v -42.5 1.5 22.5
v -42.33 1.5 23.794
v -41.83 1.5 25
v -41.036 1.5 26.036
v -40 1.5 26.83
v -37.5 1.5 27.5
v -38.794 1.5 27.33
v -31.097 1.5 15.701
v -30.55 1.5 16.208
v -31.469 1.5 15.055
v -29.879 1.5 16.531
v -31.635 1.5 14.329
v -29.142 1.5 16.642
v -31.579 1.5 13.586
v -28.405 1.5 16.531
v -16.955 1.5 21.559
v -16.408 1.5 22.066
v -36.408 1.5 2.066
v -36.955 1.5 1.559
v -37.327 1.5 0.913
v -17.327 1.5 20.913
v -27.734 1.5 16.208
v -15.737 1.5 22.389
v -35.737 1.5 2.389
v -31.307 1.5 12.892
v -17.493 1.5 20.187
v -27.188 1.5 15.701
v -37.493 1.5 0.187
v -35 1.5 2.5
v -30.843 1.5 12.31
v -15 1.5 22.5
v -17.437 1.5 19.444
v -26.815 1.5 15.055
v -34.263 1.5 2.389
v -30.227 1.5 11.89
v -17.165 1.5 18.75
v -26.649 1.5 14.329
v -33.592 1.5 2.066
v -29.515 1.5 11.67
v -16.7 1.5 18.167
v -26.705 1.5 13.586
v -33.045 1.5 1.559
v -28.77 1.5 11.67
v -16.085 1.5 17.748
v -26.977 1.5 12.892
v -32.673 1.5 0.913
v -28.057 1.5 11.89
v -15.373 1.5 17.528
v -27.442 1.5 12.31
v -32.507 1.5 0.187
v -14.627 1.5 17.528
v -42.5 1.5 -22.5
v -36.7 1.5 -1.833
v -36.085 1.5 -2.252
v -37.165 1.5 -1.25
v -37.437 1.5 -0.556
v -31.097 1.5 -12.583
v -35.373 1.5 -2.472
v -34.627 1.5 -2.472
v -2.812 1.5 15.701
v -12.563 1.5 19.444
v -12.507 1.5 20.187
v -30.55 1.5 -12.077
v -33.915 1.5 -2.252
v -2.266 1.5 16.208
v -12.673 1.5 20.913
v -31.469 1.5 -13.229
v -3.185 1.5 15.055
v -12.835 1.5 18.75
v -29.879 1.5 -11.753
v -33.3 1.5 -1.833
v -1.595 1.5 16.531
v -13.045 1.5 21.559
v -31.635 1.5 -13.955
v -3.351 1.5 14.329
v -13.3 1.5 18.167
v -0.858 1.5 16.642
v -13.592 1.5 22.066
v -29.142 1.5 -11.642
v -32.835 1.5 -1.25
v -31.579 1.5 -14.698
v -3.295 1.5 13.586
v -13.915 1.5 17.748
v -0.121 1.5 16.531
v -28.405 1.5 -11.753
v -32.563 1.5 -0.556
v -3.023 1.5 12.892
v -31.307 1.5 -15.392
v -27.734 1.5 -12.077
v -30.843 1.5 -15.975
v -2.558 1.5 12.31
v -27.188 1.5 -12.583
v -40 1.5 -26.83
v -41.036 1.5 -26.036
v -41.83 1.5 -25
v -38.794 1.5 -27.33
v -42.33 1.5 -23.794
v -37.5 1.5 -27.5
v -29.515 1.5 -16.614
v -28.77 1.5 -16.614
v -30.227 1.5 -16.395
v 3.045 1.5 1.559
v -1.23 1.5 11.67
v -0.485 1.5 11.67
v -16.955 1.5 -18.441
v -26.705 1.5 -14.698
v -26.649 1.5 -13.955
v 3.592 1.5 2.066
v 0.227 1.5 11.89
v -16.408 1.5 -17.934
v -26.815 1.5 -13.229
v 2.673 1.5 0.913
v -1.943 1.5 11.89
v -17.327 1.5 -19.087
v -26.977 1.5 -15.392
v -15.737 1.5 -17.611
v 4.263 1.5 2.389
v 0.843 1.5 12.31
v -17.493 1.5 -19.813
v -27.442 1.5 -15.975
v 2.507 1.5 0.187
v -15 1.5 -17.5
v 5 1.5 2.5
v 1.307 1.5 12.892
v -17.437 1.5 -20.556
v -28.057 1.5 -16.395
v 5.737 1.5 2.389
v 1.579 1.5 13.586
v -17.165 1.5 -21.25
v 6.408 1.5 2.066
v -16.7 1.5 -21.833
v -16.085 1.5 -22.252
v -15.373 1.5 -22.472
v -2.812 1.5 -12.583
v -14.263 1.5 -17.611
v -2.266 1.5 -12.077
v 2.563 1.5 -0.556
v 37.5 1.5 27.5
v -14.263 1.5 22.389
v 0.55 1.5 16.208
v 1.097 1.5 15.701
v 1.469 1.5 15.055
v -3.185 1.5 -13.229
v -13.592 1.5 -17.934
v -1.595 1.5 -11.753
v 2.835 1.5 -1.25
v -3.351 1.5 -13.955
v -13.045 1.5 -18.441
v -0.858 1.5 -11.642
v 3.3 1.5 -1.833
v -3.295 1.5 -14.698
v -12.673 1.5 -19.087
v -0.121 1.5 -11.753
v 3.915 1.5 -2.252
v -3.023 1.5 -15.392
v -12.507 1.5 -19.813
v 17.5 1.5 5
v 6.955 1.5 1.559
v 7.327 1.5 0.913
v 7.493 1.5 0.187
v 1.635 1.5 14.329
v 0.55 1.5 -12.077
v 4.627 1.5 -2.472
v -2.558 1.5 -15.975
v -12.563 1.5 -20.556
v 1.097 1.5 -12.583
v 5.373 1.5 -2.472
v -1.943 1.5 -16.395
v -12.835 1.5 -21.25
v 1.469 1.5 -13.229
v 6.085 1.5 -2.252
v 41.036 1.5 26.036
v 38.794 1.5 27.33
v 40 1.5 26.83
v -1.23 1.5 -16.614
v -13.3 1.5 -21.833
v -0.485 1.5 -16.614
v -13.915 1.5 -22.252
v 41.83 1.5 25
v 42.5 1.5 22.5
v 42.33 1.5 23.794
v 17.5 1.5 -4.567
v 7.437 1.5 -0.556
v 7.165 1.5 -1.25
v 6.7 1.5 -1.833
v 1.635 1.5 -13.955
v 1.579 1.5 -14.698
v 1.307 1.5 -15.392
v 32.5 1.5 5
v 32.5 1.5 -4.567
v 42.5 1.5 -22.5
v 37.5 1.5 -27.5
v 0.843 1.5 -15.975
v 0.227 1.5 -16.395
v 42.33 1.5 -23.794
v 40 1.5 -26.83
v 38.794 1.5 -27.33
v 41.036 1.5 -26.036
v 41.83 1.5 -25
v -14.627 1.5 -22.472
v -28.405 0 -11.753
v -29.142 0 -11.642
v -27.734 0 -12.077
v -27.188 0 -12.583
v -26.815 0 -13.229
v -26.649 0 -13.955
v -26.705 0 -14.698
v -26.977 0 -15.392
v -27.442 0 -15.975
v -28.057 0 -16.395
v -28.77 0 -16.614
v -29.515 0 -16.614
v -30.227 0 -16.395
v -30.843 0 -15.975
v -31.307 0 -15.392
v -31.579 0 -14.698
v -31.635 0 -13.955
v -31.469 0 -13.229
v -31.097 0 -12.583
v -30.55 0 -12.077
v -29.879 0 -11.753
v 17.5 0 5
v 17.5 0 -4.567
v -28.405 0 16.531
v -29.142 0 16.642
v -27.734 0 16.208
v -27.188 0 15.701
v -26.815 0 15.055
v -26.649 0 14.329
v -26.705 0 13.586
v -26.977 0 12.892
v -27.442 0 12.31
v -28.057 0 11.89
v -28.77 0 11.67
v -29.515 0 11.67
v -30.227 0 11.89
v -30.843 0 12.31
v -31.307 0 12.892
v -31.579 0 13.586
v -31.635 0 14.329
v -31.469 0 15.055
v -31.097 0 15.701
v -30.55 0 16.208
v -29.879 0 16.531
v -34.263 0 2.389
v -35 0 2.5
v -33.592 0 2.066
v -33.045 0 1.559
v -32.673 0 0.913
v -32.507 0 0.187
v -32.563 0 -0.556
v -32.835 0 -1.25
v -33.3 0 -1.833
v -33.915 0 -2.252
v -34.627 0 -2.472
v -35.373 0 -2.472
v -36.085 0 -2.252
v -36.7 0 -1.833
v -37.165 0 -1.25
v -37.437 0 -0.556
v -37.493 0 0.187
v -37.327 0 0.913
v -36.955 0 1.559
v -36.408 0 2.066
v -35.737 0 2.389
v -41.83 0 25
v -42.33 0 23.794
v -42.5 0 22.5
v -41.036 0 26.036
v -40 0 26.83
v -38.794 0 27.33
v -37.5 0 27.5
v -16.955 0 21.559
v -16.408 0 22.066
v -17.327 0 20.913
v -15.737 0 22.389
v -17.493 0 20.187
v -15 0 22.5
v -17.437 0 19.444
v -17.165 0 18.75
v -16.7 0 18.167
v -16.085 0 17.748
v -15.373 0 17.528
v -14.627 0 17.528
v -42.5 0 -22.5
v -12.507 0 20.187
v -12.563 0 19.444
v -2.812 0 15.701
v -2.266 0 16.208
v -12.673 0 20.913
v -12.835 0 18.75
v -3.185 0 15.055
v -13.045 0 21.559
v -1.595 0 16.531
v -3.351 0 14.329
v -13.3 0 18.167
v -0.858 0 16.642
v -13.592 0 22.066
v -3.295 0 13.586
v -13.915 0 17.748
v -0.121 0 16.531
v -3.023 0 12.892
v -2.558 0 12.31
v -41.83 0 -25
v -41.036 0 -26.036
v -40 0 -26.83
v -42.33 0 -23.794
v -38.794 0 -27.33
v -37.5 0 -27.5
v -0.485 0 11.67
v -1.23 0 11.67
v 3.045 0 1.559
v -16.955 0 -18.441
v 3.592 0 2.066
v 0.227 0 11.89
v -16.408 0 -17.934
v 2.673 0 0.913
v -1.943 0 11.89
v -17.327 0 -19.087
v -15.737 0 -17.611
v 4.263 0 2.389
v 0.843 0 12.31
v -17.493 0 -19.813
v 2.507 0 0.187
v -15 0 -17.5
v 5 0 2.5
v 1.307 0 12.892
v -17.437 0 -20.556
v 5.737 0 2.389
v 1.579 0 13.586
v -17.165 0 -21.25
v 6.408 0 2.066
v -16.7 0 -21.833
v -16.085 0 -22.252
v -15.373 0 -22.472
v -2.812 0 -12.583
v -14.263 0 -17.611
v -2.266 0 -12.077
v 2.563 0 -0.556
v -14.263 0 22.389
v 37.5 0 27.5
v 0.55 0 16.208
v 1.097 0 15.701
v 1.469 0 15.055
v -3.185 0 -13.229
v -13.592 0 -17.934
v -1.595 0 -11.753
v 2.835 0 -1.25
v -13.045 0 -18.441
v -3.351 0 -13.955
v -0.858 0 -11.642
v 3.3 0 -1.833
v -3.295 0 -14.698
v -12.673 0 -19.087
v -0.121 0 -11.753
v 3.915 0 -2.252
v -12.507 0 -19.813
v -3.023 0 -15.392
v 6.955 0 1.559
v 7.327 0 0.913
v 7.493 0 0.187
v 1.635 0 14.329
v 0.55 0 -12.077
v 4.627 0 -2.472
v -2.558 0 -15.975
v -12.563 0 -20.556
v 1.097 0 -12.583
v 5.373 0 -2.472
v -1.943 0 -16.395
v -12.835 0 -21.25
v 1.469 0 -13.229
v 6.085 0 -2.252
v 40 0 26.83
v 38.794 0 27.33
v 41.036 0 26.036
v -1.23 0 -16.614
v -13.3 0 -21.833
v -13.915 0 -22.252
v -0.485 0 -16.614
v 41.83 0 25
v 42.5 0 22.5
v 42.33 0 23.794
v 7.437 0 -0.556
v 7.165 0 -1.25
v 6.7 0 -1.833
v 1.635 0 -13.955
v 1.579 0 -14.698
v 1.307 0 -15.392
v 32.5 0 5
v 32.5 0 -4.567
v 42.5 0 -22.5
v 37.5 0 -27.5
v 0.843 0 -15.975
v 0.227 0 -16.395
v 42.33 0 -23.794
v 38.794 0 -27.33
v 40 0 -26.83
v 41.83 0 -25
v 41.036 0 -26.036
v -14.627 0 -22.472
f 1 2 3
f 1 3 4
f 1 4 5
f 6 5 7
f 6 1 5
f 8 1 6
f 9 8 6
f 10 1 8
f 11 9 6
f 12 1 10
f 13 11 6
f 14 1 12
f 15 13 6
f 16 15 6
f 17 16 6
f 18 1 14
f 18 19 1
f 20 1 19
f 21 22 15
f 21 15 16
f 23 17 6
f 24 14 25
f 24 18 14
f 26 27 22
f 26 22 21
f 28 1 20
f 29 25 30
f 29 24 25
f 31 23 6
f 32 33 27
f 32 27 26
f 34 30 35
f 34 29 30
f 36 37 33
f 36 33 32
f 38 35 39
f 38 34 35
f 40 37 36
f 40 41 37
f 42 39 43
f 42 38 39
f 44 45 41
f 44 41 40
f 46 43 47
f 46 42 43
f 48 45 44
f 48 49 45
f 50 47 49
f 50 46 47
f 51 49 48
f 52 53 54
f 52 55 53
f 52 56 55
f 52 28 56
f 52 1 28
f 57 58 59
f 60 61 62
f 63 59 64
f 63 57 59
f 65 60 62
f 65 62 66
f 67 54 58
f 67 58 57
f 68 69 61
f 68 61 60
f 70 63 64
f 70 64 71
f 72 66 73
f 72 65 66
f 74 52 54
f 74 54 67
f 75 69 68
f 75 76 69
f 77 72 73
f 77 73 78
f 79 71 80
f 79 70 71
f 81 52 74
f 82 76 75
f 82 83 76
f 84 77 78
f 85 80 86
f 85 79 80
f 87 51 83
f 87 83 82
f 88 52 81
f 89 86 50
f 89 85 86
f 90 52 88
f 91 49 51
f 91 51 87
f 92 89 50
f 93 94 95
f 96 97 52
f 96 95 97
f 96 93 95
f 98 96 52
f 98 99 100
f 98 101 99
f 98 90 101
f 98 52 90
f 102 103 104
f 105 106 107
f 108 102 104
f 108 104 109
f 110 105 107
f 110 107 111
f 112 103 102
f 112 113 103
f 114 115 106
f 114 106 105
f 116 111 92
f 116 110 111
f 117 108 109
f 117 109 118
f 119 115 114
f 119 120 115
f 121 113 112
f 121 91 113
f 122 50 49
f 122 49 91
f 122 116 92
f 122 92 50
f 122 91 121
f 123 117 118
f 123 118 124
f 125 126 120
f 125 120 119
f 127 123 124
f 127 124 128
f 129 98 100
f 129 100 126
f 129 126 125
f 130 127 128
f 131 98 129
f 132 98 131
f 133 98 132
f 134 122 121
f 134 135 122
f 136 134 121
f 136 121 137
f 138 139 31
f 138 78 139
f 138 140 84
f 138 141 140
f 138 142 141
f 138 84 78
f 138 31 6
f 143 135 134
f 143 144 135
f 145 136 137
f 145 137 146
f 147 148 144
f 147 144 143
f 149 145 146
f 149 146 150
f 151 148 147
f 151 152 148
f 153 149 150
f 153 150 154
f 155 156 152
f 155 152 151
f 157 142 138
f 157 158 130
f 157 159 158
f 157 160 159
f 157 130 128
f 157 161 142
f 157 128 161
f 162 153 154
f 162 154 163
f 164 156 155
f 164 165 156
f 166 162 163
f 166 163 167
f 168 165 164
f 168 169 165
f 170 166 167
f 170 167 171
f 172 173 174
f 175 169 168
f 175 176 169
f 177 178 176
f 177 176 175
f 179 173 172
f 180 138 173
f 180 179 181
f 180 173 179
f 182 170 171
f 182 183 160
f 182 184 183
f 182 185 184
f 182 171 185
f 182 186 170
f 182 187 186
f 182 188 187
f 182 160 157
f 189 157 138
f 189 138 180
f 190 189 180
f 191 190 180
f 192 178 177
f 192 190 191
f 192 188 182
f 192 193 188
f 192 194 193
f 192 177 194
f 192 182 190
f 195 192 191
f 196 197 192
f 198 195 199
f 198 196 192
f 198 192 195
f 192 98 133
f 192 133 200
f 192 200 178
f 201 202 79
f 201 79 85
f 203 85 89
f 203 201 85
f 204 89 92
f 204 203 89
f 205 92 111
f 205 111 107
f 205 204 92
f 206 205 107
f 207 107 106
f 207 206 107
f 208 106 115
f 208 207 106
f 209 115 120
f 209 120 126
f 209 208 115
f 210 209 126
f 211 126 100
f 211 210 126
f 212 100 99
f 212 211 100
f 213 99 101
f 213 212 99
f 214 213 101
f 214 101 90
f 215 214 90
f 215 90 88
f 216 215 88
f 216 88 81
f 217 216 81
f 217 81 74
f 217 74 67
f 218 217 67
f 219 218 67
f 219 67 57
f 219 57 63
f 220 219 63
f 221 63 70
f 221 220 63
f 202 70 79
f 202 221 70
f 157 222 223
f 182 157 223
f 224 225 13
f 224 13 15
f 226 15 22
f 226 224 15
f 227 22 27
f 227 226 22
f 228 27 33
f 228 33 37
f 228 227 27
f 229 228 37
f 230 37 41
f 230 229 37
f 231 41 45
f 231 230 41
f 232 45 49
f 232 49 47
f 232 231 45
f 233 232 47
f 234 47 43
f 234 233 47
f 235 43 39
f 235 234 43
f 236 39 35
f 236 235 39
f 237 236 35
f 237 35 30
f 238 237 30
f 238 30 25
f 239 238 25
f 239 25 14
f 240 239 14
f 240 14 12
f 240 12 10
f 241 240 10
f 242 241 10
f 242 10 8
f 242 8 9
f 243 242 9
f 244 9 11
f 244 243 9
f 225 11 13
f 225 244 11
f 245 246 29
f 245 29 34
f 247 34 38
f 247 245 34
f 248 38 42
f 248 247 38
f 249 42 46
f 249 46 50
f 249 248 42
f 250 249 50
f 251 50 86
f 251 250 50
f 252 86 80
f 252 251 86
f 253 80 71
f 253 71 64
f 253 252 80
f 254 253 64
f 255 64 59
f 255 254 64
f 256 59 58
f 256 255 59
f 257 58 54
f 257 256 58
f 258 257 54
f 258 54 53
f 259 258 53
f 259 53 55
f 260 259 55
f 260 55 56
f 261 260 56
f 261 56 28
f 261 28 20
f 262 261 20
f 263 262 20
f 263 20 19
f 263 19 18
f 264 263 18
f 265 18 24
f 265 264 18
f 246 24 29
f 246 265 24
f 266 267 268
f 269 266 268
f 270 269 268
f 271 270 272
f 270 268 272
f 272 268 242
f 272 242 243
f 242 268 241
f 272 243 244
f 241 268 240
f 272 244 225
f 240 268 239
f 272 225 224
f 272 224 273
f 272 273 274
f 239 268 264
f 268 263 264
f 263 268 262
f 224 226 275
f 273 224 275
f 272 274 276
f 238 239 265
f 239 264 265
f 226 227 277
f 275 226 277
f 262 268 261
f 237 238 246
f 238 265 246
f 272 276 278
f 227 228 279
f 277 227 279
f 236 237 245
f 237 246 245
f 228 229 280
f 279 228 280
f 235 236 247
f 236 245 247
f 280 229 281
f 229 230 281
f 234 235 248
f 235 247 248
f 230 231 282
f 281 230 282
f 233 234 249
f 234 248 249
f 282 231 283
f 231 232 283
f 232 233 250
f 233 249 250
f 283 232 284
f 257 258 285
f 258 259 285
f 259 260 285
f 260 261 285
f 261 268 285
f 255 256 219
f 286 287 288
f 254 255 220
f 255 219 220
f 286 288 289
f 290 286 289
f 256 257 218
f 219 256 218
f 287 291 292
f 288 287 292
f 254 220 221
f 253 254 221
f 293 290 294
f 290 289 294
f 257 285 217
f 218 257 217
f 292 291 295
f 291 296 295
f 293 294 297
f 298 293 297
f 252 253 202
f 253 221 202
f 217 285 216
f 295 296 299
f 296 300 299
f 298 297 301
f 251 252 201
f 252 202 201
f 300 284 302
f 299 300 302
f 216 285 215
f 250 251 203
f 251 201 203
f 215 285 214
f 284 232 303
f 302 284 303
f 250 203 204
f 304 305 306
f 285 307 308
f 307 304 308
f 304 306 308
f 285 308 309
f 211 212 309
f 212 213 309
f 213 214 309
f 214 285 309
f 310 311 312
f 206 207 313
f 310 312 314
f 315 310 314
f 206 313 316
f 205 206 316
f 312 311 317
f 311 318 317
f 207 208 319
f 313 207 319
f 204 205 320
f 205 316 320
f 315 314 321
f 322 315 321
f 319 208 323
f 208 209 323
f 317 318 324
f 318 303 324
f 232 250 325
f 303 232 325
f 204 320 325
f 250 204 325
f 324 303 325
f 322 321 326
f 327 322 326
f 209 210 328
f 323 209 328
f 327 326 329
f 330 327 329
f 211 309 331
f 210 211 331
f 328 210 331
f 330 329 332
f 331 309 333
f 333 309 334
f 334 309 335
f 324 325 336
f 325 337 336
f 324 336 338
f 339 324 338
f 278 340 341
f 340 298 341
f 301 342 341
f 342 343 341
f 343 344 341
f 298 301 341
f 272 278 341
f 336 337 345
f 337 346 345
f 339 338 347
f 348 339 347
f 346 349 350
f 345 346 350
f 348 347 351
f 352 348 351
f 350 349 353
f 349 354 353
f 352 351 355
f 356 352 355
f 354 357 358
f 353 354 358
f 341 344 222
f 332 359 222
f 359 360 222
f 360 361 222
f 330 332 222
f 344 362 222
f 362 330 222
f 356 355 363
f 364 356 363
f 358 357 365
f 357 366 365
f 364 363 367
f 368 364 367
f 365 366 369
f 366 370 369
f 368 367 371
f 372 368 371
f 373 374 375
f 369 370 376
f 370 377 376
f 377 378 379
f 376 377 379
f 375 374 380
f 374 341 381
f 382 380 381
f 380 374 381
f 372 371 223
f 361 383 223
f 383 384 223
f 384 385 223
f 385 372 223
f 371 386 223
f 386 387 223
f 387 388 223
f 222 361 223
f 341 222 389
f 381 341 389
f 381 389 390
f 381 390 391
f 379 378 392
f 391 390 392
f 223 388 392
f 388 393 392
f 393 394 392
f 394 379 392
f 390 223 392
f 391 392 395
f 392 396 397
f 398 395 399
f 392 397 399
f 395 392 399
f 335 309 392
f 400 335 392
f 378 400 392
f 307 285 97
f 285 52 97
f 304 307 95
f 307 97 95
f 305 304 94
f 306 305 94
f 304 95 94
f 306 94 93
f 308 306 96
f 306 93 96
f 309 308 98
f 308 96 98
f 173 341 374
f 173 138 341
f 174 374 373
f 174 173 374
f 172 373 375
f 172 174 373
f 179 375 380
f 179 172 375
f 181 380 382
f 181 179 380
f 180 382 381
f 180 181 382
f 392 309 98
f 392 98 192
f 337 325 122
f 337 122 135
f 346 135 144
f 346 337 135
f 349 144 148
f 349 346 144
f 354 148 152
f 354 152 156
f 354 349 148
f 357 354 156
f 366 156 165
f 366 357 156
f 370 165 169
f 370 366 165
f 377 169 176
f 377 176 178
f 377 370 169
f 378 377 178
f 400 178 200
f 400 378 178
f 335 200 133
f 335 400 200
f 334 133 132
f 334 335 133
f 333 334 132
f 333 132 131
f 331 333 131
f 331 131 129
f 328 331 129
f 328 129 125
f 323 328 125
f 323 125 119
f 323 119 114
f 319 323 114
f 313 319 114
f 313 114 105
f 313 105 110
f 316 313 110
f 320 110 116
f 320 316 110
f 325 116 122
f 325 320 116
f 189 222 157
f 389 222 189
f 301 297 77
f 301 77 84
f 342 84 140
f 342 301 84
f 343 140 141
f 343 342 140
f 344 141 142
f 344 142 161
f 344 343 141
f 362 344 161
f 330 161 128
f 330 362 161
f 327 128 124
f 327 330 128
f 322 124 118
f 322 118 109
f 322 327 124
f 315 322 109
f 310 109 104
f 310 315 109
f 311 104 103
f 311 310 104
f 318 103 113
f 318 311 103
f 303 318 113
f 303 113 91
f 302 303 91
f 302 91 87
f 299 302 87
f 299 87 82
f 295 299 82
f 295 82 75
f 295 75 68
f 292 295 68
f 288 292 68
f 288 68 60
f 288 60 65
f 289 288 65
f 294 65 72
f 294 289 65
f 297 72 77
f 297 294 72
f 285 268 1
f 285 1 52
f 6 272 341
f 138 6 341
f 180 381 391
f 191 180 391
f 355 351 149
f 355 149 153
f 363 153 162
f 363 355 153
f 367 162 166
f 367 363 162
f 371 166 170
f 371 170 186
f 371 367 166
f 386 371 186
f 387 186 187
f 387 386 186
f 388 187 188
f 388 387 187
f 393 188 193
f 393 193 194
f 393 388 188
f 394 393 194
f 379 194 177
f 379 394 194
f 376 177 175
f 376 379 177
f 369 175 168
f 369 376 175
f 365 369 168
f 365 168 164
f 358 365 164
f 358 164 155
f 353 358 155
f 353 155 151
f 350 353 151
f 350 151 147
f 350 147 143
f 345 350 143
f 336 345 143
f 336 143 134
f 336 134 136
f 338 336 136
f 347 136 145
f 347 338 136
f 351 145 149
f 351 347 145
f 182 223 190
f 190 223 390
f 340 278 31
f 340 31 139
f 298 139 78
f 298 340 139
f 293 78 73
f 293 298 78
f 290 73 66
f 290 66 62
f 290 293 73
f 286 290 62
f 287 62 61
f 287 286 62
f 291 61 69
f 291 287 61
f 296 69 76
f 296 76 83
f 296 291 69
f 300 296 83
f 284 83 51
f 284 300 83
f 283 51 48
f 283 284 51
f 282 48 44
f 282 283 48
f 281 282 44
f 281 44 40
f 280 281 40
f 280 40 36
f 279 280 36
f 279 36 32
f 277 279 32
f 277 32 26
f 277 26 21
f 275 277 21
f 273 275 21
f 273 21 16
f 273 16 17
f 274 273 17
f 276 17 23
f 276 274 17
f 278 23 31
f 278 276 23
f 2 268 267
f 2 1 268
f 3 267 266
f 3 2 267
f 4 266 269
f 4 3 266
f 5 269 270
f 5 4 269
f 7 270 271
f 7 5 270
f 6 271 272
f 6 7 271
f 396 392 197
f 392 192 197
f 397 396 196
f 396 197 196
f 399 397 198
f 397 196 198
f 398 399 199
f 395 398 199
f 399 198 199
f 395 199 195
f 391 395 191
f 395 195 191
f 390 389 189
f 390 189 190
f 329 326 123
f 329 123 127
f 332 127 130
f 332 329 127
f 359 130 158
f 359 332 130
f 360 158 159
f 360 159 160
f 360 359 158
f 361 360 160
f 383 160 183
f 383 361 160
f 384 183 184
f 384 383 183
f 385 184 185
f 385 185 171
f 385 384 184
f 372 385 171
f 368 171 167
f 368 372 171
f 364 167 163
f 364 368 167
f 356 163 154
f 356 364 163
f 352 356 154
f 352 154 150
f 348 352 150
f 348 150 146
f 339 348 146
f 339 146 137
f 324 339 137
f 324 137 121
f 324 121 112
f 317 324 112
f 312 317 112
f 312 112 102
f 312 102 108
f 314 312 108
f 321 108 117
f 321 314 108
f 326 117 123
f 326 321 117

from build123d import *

# Parameters (mm, degrees)
SKETCH1_W           = 85
SKETCH1_H           = 55
SKETCH1_R           = 2.5
SKETCH1_W_2         = 15
SKETCH1_H_2         = 9.566733068
BOSS_EXTRUDE1_DEPTH = 1.5
FILLET1_R           = 5


with BuildPart() as part:
    # Sketch1 → Boss-Extrude1 (new body)
    with BuildSketch(Plane(origin=(0, 0, 0), x_dir=(1, 0, 0), z_dir=(0, 1, 0))):
        Rectangle(SKETCH1_W, SKETCH1_H)
        with Locations(Location((-35, 0, 0), (0, 0, 270))):
            Circle(SKETCH1_R, mode=Mode.SUBTRACT)
        with Locations(Location((-29.142135624, 14.142135624, 0), (0, 0, 270))):
            Circle(SKETCH1_R, mode=Mode.SUBTRACT)
        with Locations(Location((-15, 20, 0), (0, 0, 270))):
            Circle(SKETCH1_R, mode=Mode.SUBTRACT)
        with Locations(Location((-0.857864376, 14.142135624, 0), (0, 0, 270))):
            Circle(SKETCH1_R, mode=Mode.SUBTRACT)
        with Locations(Location((5, 0, 0), (0, 0, 270))):
            Circle(SKETCH1_R, mode=Mode.SUBTRACT)
        with Locations(Location((-0.857864376, -14.142135624, 0), (0, 0, 270))):
            Circle(SKETCH1_R, mode=Mode.SUBTRACT)
        with Locations(Location((-15, -20, 0), (0, 0, 270))):
            Circle(SKETCH1_R, mode=Mode.SUBTRACT)
        with Locations(Location((-29.142135624, -14.142135624, 0), (0, 0, 270))):
            Circle(SKETCH1_R, mode=Mode.SUBTRACT)
        with Locations((25, -0.216633466)):
            Rectangle(SKETCH1_W_2, SKETCH1_H_2, mode=Mode.SUBTRACT)
    extrude(amount=BOSS_EXTRUDE1_DEPTH)

    # Fillet1
    fillet1_edges = [part.edges().sort_by_distance(p)[0] for p in [
        (-42.5, 0.75, -27.5),
        (42.5, 0.75, -27.5),
        (42.5, 0.75, 27.5),
        (-42.5, 0.75, 27.5),
    ]]
    fillet(fillet1_edges, radius=FILLET1_R)


solid = part.part
